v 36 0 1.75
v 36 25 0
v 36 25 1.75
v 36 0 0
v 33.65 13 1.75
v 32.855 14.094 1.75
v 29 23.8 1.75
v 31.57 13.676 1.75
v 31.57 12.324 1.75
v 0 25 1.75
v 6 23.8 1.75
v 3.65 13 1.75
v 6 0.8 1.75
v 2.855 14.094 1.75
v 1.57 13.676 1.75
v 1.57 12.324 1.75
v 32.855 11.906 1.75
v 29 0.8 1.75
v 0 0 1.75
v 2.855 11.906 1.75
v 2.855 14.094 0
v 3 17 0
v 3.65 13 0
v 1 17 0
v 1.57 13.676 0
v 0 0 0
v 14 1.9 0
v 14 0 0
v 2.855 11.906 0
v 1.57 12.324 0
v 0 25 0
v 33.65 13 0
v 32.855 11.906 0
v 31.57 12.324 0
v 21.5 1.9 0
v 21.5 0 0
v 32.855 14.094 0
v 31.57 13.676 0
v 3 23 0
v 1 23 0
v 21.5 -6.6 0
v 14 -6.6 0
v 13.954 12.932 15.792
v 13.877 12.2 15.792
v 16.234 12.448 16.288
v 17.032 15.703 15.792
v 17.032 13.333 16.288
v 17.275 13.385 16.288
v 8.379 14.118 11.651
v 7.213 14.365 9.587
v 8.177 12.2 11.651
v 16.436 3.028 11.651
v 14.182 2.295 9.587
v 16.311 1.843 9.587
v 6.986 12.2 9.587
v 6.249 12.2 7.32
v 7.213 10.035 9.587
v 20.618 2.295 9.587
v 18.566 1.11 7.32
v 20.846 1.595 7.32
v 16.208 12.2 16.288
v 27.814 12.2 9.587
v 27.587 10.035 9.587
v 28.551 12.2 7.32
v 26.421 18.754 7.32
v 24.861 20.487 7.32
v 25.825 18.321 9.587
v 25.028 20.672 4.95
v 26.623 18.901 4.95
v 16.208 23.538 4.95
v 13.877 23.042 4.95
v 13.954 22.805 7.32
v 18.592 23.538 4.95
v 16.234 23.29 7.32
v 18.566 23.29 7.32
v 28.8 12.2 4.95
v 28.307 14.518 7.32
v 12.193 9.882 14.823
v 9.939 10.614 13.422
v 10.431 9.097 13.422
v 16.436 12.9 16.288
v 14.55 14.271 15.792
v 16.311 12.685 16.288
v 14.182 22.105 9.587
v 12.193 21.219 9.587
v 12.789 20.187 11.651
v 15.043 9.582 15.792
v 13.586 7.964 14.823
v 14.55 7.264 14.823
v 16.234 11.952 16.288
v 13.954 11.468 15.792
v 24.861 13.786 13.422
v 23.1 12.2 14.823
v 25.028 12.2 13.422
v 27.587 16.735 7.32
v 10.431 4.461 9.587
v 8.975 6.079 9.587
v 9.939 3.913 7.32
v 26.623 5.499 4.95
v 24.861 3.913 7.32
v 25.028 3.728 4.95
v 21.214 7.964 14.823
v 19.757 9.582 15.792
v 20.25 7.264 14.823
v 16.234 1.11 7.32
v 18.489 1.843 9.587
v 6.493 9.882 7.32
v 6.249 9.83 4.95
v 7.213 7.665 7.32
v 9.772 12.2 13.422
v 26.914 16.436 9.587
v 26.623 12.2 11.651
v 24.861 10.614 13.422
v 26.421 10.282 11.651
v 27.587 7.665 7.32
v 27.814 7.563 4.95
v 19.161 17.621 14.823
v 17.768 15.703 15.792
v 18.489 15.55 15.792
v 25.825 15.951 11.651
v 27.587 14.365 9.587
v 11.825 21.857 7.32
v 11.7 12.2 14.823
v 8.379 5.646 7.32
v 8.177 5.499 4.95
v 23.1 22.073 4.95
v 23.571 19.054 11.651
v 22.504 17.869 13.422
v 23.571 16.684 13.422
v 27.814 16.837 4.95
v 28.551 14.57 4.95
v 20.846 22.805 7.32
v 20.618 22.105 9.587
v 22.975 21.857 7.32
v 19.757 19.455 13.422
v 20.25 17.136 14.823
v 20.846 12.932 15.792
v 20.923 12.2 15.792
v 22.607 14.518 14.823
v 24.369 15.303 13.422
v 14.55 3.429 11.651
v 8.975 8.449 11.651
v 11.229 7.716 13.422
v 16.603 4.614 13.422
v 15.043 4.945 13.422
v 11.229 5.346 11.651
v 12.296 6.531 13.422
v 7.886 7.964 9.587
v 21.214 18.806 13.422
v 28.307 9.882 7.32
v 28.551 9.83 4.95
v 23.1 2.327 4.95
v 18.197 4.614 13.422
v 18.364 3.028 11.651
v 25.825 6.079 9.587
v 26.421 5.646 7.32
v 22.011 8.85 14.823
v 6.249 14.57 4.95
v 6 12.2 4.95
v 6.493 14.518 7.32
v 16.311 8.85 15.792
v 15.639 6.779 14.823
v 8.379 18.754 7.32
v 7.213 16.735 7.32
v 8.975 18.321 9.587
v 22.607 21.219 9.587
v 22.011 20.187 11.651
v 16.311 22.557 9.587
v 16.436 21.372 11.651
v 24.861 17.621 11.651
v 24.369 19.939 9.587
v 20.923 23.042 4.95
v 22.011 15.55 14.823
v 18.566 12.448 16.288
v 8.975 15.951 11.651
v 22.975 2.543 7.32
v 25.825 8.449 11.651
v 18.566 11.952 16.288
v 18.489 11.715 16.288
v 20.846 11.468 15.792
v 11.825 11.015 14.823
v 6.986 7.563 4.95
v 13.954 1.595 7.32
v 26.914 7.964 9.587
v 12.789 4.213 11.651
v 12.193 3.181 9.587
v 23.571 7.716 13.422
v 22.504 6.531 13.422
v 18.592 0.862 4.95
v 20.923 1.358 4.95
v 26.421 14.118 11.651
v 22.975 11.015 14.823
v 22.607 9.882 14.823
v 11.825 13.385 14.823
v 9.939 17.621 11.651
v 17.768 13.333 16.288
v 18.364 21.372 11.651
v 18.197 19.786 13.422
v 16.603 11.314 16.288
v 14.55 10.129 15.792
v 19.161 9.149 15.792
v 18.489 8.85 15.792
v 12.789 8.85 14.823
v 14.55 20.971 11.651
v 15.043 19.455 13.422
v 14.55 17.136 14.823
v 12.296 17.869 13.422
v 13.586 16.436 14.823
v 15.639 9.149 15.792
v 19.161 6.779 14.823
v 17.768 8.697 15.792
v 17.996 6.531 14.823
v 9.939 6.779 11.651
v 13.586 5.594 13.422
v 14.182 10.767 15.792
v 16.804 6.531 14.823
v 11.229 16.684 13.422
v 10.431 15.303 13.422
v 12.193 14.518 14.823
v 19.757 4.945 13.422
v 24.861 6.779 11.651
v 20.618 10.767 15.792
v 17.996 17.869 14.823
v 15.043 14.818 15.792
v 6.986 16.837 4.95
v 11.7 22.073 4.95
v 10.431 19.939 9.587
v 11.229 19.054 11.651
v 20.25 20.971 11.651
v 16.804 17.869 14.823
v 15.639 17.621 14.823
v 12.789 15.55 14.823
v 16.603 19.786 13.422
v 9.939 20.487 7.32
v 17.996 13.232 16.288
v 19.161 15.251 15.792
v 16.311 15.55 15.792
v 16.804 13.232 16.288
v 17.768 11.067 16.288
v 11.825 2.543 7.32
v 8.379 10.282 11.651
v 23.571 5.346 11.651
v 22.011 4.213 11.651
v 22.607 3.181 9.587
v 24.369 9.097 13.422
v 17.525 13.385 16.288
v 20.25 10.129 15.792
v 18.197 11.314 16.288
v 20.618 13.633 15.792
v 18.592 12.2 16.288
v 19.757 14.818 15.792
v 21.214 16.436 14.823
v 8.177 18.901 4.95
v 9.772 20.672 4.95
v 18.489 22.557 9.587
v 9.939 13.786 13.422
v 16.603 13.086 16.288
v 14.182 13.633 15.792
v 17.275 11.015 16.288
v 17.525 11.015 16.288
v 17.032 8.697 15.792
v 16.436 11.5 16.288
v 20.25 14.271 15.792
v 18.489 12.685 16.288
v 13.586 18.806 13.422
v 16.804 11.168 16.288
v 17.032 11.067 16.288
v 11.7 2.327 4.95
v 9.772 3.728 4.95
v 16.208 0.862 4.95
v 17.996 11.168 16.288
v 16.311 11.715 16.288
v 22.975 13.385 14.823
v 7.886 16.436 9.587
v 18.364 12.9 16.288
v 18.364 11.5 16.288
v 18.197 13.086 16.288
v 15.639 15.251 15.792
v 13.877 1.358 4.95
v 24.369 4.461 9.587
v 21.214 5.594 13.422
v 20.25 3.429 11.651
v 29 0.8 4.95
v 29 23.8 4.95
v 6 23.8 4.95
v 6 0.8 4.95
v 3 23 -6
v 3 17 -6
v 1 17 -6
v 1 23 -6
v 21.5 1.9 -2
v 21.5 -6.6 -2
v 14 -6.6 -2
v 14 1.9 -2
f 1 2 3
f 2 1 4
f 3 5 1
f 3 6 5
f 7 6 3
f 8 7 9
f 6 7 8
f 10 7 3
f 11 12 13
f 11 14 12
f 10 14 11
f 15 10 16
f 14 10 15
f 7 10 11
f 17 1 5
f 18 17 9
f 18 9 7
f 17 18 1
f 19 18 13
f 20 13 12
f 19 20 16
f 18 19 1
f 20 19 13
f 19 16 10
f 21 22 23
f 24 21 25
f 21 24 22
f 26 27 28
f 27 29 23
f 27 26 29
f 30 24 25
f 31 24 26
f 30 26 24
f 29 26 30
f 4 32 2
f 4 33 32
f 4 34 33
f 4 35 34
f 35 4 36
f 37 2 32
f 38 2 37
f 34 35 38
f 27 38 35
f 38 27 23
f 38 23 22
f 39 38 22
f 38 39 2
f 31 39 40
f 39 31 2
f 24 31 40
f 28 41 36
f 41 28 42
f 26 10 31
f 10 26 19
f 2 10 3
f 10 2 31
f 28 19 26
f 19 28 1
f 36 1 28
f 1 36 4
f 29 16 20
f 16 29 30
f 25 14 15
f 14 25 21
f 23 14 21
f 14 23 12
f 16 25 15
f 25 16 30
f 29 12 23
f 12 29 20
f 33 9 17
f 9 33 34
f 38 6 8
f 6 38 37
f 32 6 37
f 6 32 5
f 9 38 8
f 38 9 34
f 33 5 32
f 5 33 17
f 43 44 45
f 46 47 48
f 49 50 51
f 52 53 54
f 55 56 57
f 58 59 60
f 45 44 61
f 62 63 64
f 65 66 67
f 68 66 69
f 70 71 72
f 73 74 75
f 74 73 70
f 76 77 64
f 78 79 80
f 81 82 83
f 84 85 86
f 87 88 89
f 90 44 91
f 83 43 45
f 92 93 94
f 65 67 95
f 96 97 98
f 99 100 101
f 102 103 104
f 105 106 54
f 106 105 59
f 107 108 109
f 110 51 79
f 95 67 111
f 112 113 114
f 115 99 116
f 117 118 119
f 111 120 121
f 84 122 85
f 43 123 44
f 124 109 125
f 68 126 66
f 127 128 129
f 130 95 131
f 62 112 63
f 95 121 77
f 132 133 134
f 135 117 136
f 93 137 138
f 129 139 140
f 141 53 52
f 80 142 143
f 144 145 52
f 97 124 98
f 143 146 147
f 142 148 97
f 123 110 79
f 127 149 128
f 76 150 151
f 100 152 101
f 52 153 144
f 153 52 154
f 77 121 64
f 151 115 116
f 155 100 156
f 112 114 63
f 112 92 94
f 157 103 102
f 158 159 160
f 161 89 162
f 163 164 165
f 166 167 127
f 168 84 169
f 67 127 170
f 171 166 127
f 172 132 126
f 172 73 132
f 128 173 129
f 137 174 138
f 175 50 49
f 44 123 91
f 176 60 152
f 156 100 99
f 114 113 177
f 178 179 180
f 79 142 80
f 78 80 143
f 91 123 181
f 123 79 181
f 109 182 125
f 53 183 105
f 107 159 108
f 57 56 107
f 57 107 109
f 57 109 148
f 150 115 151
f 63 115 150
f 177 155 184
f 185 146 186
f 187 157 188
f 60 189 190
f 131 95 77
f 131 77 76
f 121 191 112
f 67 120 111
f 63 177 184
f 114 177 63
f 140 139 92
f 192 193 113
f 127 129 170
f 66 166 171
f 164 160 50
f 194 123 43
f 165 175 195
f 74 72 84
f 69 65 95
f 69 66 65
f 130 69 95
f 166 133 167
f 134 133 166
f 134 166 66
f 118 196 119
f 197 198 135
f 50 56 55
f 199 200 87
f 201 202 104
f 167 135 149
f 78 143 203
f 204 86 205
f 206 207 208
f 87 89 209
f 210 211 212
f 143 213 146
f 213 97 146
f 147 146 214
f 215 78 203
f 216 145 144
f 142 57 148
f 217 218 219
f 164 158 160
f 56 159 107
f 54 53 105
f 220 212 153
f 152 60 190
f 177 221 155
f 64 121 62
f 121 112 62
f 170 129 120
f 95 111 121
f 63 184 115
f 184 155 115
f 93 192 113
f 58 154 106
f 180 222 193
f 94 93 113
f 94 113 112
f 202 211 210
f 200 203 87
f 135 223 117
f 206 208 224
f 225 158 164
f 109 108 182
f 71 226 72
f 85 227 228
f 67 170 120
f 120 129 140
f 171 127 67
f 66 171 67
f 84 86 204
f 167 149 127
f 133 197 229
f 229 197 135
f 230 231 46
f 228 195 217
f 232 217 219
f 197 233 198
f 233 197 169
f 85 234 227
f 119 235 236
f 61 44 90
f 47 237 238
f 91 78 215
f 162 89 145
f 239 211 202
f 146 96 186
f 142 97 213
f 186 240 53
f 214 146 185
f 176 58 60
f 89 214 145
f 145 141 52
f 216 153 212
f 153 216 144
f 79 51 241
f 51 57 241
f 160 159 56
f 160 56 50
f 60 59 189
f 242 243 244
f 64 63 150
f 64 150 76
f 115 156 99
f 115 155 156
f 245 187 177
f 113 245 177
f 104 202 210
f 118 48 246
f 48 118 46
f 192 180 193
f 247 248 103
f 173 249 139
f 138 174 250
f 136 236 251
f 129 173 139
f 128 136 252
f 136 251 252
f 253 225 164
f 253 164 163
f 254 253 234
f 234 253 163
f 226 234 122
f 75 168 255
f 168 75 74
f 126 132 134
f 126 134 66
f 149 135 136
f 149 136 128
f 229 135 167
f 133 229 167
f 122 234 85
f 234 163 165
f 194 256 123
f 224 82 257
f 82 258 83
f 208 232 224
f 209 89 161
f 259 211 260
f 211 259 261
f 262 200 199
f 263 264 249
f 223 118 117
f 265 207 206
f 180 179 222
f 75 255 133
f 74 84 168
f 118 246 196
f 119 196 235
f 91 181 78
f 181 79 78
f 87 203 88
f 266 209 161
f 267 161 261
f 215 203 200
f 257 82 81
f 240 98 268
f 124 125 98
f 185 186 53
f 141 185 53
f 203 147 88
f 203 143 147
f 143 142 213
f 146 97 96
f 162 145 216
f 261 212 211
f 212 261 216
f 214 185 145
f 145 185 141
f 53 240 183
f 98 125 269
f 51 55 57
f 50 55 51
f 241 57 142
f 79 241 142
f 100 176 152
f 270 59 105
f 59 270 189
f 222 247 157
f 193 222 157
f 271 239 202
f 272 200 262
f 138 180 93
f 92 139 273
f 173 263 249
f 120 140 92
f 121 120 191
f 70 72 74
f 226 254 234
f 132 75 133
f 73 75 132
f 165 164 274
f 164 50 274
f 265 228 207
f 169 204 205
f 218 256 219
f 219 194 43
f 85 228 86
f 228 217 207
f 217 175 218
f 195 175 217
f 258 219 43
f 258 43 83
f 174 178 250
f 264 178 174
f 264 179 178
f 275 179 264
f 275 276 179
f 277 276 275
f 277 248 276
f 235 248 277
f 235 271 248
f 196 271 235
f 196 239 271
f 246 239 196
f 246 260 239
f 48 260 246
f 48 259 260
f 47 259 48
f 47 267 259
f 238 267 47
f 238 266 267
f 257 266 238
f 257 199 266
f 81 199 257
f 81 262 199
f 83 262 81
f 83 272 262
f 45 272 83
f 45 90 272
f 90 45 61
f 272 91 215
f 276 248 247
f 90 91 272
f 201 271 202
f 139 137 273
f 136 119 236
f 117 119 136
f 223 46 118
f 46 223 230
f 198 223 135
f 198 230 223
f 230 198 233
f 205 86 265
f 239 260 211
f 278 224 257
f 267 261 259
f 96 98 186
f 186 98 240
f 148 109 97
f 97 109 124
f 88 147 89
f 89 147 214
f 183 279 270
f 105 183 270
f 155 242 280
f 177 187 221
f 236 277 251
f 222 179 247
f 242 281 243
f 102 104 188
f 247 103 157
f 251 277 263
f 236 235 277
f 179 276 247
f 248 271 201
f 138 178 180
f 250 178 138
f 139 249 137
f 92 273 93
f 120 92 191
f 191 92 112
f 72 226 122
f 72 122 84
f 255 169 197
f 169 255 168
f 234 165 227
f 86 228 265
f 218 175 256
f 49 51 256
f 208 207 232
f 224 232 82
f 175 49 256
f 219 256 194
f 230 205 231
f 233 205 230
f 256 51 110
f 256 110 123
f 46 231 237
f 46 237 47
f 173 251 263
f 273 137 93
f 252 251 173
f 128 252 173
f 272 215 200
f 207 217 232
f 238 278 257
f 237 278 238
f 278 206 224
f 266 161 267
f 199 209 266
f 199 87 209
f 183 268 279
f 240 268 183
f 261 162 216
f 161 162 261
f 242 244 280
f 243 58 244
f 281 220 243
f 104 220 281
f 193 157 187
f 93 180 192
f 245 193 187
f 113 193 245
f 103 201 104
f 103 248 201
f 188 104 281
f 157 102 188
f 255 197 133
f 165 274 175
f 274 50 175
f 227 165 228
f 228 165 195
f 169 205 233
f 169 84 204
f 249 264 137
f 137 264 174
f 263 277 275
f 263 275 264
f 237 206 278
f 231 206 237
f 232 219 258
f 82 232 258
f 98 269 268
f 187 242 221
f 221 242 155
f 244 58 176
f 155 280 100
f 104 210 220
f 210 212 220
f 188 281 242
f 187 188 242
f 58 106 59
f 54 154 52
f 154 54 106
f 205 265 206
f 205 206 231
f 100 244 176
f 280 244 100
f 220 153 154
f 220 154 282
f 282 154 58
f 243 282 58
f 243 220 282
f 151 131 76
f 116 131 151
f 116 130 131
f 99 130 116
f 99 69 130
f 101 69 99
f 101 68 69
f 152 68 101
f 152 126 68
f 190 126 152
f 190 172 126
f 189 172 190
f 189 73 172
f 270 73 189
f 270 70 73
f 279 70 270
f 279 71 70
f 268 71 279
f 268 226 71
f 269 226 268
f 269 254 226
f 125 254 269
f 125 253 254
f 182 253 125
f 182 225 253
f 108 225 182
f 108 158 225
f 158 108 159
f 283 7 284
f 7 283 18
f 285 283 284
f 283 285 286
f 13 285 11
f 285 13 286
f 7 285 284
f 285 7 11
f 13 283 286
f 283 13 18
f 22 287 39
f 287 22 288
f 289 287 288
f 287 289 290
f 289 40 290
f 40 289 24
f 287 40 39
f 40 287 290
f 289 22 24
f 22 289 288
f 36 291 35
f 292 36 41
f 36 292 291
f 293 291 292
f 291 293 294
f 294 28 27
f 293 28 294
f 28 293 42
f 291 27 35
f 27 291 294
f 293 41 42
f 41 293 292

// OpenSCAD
pcb_thickness = 1.75;
pcb_width = 36;
pcb_height = 25;

sensor_base_width = 23;
sensor_base_thickness = 3.2;
sensor_orb_radius = 11.4;

module pcb (x, y, z) {
	translate([x, y, z]) {
		difference() {
			color("teal") cube(size=[pcb_width, pcb_height, pcb_thickness]);		
			translate([2.5, 13, -0.5]) cylinder(h = pcb_thickness + 1, r = 1.15);
			translate([32.5, 13, -0.5]) cylinder(h = pcb_thickness + 1, r = 1.15);
		}
	}
}

module sensor (x, y, z) {
	translate([x, y, z]) {
		color("white") 
		union() {
			cube(size=[sensor_base_width, sensor_base_width, sensor_base_thickness]);
			translate([sensor_orb_radius, sensor_orb_radius, sensor_base_thickness])
			difference() {
				sphere(sensor_orb_radius);
				translate([-(sensor_orb_radius + 0.5), -(sensor_orb_radius + 0.5), -(2*sensor_orb_radius + 1)]) cube(size=[2*sensor_orb_radius + 1, 2*sensor_orb_radius + 1, 2*sensor_orb_radius + 1]);
			}
		}		
	}
}

module jumper (x, y, z) {
	translate([x, y, z]) {	
		color("black") cube(size=[2, 6, 6]);
	}
}

module connector (x, y, z) {
	translate([x, y, z]) {	
		color("black") cube(size=[7.5, 8.5, 2]);
	}
}


module PIRSensor (x, y, z) {
	translate([x, y, z]) {
		pcb(0,0,0);
		sensor(6, 0.8, pcb_thickness);	
		jumper(1, 17, -6);	
		connector(14,-6.6,-2);
	}
}

PIRSensor(0,0,0);
